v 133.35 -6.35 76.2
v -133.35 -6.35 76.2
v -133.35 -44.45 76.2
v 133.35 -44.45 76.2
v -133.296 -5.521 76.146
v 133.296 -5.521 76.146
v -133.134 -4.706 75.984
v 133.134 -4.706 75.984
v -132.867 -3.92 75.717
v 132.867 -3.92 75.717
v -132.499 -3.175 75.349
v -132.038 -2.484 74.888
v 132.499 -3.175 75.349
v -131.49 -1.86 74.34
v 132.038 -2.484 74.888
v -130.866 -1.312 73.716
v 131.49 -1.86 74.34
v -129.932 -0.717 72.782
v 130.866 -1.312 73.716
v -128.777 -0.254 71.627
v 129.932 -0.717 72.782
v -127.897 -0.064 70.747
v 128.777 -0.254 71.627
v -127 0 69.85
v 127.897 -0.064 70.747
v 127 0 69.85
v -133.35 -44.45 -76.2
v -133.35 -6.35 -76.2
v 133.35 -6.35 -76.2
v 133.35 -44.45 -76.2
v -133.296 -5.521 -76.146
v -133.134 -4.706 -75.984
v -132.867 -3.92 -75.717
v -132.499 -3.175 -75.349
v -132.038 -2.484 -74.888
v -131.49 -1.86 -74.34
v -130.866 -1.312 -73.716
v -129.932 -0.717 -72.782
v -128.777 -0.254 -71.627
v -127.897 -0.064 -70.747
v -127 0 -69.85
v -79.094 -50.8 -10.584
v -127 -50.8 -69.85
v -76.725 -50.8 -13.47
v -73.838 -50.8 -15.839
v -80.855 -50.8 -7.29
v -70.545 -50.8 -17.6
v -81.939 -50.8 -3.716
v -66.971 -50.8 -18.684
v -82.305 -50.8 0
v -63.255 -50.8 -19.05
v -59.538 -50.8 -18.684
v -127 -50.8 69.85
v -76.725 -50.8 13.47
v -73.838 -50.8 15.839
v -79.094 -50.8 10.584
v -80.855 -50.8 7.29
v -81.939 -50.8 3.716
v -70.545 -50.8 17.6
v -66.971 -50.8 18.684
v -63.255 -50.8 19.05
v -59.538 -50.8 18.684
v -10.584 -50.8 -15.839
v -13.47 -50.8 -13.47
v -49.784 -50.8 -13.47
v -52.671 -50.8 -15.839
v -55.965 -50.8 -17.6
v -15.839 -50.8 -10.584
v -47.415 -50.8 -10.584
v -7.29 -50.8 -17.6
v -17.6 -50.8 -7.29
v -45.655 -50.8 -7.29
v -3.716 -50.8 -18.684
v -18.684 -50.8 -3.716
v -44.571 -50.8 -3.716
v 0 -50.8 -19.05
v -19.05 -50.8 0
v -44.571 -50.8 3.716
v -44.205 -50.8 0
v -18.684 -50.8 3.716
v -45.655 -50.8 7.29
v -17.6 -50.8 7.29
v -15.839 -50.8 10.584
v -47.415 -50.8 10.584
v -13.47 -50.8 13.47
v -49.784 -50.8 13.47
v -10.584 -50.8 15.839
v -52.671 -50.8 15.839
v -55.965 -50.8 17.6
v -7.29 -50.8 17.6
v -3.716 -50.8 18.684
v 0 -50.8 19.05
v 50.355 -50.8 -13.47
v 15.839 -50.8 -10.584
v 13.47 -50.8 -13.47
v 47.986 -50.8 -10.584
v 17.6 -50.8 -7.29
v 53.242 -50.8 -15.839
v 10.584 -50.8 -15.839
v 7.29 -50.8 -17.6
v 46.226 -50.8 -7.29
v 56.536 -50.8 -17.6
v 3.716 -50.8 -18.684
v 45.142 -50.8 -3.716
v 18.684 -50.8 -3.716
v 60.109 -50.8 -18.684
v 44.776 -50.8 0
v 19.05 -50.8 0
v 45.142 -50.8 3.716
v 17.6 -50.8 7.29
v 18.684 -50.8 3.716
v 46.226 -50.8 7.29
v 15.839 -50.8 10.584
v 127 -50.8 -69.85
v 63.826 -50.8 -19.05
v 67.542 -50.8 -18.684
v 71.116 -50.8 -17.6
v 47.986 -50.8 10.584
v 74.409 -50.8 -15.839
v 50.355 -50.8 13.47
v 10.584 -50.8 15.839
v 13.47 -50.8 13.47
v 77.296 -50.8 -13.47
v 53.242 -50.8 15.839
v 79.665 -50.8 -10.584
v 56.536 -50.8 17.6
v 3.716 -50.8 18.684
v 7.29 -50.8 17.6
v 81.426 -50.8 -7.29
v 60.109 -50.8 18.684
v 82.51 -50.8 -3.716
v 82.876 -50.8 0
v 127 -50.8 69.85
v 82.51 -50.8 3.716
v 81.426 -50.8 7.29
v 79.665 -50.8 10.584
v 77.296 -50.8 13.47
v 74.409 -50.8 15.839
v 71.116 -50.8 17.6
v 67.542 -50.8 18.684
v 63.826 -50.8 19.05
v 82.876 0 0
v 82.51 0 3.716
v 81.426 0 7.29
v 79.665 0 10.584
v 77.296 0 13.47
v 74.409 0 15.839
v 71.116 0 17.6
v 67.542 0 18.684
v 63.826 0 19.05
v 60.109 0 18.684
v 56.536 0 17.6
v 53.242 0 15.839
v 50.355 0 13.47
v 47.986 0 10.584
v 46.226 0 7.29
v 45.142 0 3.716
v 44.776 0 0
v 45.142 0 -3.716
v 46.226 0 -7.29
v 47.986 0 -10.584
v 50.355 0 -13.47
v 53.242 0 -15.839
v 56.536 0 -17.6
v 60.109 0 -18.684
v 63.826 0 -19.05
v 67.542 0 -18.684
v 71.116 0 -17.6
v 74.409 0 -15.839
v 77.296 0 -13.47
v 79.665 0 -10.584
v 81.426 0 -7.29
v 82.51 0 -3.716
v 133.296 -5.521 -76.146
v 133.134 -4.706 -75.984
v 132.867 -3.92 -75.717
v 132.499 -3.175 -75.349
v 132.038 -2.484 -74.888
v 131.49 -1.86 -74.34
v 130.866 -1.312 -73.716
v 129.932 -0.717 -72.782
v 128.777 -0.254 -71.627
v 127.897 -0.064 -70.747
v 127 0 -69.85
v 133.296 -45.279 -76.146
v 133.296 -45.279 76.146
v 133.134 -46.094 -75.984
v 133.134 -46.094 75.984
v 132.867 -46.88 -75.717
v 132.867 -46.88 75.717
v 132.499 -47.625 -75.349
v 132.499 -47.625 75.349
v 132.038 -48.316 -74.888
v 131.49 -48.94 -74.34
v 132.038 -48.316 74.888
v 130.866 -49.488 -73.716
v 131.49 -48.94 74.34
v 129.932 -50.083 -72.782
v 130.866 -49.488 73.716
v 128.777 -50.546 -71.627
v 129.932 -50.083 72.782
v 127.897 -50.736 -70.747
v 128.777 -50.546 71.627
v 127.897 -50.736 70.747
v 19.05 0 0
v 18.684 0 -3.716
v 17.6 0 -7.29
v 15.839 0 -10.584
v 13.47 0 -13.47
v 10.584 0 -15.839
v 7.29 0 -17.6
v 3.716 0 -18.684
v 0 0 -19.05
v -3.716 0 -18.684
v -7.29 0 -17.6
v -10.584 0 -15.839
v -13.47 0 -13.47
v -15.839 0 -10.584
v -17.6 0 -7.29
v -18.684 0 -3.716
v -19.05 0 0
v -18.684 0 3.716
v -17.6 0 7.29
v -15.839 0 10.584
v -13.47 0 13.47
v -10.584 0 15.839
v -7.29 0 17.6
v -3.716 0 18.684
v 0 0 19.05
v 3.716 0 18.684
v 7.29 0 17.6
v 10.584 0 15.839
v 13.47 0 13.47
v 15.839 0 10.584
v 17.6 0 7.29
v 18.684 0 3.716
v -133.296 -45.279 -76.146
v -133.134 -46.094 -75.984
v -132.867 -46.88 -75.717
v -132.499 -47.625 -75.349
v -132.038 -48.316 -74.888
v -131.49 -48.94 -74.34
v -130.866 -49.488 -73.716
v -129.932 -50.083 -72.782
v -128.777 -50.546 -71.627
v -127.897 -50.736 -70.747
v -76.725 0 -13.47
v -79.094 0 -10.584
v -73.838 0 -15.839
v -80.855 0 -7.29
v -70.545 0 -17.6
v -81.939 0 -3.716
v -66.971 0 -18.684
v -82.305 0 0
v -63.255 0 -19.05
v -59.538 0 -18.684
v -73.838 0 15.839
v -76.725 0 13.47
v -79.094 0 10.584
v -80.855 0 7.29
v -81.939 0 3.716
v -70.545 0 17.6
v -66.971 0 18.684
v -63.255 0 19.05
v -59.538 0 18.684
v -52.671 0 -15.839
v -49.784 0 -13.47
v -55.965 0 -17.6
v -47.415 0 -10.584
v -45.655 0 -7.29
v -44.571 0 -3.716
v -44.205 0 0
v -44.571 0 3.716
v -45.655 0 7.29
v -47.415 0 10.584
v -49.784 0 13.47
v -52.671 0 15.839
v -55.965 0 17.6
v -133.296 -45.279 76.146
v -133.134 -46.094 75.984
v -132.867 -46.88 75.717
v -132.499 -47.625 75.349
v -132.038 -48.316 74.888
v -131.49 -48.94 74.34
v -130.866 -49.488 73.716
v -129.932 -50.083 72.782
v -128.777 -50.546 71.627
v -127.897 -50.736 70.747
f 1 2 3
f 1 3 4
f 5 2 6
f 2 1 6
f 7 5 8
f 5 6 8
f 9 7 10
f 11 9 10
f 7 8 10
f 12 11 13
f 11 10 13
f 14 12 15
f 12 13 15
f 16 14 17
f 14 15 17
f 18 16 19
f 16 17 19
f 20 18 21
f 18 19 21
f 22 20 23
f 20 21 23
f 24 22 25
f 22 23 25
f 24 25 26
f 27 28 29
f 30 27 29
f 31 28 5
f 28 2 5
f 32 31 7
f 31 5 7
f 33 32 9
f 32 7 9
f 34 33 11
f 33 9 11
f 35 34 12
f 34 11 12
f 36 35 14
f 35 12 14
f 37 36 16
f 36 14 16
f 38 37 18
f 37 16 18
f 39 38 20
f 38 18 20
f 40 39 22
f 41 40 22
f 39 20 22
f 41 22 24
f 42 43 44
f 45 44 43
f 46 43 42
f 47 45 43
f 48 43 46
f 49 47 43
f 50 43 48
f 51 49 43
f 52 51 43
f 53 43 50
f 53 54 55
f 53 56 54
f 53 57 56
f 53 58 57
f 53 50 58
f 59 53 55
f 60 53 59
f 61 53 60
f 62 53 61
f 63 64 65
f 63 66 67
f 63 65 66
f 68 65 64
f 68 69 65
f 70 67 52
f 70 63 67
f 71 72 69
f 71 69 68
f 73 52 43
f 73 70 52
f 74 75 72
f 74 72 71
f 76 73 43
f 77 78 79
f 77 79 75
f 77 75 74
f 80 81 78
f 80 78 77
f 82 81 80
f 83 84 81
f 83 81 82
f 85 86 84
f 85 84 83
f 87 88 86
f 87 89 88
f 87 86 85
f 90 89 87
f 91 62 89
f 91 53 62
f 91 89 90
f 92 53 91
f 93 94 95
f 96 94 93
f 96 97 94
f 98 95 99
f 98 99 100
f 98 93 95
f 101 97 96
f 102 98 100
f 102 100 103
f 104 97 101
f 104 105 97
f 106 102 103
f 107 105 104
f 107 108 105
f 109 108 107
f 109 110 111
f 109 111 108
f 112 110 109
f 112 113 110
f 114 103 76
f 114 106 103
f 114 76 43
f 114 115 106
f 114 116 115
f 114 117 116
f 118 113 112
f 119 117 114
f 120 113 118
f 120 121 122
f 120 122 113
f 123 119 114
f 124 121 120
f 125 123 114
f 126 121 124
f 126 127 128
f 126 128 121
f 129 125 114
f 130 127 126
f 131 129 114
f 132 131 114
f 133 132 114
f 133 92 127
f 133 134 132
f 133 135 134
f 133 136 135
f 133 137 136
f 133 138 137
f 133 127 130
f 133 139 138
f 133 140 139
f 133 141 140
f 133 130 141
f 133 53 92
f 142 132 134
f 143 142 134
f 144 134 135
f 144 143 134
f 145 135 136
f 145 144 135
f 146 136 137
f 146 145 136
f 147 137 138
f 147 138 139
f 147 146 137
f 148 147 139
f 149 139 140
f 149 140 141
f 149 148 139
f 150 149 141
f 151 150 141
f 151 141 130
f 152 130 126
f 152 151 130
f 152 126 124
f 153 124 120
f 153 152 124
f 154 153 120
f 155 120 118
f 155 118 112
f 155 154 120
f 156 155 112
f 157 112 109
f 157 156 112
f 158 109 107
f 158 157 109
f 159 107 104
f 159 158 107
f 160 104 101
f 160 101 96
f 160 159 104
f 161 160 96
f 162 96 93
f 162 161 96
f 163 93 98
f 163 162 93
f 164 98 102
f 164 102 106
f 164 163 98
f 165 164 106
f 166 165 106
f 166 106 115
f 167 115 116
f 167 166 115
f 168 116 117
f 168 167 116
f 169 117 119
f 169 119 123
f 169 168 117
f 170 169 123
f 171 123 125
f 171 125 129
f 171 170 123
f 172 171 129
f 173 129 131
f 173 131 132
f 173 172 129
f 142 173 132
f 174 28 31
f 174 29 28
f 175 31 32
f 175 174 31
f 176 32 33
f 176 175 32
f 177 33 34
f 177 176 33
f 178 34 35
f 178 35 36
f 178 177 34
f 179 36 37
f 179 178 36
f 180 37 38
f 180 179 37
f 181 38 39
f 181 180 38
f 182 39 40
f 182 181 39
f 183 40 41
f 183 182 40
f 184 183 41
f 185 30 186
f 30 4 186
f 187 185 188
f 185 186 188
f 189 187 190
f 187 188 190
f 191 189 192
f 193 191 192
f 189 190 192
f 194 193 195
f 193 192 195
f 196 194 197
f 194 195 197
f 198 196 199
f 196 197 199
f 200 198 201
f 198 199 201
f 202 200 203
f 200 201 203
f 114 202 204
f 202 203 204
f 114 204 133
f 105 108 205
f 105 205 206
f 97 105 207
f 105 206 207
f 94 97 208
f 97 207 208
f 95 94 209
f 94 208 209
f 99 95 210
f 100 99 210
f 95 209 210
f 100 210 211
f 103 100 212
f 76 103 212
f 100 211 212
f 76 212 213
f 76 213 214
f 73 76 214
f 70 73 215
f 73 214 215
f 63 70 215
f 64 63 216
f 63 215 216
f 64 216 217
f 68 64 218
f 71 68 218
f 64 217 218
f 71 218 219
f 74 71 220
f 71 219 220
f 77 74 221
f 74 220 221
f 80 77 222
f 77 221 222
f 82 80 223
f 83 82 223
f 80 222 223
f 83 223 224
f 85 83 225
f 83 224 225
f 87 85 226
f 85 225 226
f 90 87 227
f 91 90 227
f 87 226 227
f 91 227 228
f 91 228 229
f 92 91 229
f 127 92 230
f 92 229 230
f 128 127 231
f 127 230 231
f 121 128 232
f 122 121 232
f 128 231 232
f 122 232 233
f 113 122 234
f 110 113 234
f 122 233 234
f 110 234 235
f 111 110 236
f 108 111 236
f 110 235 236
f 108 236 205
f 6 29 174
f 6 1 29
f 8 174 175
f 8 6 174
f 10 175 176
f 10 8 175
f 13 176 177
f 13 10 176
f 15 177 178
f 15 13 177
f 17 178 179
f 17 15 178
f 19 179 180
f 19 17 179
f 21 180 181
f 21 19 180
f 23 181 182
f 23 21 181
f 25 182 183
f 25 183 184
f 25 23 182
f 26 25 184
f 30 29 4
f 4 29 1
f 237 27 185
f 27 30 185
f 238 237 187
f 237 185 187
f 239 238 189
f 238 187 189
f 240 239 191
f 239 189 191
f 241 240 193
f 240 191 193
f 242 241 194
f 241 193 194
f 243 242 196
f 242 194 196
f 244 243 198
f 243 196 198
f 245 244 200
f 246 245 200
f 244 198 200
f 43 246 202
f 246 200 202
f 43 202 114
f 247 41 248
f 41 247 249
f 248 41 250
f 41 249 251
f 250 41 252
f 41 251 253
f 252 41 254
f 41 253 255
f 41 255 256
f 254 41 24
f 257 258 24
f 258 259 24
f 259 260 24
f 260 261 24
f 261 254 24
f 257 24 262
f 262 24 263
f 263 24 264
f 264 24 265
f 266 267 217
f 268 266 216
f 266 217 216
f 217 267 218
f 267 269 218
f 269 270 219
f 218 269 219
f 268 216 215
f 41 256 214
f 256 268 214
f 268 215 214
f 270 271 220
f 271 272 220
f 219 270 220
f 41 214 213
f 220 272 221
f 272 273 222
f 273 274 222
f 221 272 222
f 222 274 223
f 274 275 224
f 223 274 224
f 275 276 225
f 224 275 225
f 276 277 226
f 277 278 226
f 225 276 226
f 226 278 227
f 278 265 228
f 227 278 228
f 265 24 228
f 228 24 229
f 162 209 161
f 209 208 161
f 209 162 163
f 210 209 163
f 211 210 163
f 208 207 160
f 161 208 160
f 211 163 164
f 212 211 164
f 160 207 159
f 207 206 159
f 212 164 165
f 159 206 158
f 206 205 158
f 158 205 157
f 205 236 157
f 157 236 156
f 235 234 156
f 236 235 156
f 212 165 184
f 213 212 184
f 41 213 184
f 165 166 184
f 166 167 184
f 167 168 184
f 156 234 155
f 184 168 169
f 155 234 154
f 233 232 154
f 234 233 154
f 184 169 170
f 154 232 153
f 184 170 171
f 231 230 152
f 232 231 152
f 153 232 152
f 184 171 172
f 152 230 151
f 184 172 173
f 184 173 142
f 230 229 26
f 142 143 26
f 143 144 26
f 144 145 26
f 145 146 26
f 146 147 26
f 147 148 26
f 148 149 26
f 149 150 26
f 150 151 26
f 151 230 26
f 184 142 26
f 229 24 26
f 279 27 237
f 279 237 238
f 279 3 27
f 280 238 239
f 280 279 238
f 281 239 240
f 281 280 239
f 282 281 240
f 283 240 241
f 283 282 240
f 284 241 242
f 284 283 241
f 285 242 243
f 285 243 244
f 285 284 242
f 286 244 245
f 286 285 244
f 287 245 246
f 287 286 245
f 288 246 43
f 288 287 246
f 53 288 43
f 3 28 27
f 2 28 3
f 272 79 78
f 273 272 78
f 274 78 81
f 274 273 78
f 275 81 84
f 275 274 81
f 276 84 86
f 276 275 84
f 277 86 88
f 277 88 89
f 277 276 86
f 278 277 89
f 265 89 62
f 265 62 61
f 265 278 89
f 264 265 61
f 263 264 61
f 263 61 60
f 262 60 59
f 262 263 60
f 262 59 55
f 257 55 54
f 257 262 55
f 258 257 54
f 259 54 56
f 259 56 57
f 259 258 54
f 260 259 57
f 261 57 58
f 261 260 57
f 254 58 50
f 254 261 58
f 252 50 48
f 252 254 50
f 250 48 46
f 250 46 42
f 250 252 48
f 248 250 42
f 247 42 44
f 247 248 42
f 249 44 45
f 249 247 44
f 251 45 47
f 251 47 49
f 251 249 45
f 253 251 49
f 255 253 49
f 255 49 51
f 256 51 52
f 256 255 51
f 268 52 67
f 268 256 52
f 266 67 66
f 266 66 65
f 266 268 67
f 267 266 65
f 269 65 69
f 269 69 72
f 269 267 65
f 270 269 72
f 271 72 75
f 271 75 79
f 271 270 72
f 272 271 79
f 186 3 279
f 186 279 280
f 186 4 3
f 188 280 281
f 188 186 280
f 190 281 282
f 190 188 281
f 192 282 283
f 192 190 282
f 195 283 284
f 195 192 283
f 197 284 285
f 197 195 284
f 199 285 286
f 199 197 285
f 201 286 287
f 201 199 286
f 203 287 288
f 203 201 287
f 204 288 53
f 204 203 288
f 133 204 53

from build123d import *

# Parameters (mm, degrees)
F0_W     = 266.7
F0_H     = 152.4
F0_R     = 19.05
F1_DEPTH = 50.8
F2_R     = 6.35


with BuildPart() as f1:
    # F0 (on Front) → F1 (new body)
    with BuildSketch(Plane.XZ):
        Rectangle(F0_W, F0_H)
        with Locations((-63.2546767592, 0)):
            Circle(F0_R, mode=Mode.SUBTRACT)
        with BuildLine():
            ThreePointArc((-19.05, 0), (0, 19.05), (19.05, 0))
            ThreePointArc((19.05, 0), (0, -19.05), (-19.05, 0))
        make_face(mode=Mode.SUBTRACT)
        with Locations((63.8258159161, 0)):
            Circle(F0_R, mode=Mode.SUBTRACT)
    extrude(amount=F1_DEPTH)

    # F2
    f2_edges = [f1.edges().sort_by_distance(p)[0] for p in [
        (0, -50.8, -76.2),
        (133.35, -50.8, 0),
        (0, -50.8, 76.2),
        (-133.35, -50.8, 0),
        (0, 0, 76.2),
        (133.35, 0, 0),
        (0, 0, -76.2),
        (-133.35, 0, 0),
    ]]
    fillet(f2_edges, radius=F2_R)


solid = f1.part
